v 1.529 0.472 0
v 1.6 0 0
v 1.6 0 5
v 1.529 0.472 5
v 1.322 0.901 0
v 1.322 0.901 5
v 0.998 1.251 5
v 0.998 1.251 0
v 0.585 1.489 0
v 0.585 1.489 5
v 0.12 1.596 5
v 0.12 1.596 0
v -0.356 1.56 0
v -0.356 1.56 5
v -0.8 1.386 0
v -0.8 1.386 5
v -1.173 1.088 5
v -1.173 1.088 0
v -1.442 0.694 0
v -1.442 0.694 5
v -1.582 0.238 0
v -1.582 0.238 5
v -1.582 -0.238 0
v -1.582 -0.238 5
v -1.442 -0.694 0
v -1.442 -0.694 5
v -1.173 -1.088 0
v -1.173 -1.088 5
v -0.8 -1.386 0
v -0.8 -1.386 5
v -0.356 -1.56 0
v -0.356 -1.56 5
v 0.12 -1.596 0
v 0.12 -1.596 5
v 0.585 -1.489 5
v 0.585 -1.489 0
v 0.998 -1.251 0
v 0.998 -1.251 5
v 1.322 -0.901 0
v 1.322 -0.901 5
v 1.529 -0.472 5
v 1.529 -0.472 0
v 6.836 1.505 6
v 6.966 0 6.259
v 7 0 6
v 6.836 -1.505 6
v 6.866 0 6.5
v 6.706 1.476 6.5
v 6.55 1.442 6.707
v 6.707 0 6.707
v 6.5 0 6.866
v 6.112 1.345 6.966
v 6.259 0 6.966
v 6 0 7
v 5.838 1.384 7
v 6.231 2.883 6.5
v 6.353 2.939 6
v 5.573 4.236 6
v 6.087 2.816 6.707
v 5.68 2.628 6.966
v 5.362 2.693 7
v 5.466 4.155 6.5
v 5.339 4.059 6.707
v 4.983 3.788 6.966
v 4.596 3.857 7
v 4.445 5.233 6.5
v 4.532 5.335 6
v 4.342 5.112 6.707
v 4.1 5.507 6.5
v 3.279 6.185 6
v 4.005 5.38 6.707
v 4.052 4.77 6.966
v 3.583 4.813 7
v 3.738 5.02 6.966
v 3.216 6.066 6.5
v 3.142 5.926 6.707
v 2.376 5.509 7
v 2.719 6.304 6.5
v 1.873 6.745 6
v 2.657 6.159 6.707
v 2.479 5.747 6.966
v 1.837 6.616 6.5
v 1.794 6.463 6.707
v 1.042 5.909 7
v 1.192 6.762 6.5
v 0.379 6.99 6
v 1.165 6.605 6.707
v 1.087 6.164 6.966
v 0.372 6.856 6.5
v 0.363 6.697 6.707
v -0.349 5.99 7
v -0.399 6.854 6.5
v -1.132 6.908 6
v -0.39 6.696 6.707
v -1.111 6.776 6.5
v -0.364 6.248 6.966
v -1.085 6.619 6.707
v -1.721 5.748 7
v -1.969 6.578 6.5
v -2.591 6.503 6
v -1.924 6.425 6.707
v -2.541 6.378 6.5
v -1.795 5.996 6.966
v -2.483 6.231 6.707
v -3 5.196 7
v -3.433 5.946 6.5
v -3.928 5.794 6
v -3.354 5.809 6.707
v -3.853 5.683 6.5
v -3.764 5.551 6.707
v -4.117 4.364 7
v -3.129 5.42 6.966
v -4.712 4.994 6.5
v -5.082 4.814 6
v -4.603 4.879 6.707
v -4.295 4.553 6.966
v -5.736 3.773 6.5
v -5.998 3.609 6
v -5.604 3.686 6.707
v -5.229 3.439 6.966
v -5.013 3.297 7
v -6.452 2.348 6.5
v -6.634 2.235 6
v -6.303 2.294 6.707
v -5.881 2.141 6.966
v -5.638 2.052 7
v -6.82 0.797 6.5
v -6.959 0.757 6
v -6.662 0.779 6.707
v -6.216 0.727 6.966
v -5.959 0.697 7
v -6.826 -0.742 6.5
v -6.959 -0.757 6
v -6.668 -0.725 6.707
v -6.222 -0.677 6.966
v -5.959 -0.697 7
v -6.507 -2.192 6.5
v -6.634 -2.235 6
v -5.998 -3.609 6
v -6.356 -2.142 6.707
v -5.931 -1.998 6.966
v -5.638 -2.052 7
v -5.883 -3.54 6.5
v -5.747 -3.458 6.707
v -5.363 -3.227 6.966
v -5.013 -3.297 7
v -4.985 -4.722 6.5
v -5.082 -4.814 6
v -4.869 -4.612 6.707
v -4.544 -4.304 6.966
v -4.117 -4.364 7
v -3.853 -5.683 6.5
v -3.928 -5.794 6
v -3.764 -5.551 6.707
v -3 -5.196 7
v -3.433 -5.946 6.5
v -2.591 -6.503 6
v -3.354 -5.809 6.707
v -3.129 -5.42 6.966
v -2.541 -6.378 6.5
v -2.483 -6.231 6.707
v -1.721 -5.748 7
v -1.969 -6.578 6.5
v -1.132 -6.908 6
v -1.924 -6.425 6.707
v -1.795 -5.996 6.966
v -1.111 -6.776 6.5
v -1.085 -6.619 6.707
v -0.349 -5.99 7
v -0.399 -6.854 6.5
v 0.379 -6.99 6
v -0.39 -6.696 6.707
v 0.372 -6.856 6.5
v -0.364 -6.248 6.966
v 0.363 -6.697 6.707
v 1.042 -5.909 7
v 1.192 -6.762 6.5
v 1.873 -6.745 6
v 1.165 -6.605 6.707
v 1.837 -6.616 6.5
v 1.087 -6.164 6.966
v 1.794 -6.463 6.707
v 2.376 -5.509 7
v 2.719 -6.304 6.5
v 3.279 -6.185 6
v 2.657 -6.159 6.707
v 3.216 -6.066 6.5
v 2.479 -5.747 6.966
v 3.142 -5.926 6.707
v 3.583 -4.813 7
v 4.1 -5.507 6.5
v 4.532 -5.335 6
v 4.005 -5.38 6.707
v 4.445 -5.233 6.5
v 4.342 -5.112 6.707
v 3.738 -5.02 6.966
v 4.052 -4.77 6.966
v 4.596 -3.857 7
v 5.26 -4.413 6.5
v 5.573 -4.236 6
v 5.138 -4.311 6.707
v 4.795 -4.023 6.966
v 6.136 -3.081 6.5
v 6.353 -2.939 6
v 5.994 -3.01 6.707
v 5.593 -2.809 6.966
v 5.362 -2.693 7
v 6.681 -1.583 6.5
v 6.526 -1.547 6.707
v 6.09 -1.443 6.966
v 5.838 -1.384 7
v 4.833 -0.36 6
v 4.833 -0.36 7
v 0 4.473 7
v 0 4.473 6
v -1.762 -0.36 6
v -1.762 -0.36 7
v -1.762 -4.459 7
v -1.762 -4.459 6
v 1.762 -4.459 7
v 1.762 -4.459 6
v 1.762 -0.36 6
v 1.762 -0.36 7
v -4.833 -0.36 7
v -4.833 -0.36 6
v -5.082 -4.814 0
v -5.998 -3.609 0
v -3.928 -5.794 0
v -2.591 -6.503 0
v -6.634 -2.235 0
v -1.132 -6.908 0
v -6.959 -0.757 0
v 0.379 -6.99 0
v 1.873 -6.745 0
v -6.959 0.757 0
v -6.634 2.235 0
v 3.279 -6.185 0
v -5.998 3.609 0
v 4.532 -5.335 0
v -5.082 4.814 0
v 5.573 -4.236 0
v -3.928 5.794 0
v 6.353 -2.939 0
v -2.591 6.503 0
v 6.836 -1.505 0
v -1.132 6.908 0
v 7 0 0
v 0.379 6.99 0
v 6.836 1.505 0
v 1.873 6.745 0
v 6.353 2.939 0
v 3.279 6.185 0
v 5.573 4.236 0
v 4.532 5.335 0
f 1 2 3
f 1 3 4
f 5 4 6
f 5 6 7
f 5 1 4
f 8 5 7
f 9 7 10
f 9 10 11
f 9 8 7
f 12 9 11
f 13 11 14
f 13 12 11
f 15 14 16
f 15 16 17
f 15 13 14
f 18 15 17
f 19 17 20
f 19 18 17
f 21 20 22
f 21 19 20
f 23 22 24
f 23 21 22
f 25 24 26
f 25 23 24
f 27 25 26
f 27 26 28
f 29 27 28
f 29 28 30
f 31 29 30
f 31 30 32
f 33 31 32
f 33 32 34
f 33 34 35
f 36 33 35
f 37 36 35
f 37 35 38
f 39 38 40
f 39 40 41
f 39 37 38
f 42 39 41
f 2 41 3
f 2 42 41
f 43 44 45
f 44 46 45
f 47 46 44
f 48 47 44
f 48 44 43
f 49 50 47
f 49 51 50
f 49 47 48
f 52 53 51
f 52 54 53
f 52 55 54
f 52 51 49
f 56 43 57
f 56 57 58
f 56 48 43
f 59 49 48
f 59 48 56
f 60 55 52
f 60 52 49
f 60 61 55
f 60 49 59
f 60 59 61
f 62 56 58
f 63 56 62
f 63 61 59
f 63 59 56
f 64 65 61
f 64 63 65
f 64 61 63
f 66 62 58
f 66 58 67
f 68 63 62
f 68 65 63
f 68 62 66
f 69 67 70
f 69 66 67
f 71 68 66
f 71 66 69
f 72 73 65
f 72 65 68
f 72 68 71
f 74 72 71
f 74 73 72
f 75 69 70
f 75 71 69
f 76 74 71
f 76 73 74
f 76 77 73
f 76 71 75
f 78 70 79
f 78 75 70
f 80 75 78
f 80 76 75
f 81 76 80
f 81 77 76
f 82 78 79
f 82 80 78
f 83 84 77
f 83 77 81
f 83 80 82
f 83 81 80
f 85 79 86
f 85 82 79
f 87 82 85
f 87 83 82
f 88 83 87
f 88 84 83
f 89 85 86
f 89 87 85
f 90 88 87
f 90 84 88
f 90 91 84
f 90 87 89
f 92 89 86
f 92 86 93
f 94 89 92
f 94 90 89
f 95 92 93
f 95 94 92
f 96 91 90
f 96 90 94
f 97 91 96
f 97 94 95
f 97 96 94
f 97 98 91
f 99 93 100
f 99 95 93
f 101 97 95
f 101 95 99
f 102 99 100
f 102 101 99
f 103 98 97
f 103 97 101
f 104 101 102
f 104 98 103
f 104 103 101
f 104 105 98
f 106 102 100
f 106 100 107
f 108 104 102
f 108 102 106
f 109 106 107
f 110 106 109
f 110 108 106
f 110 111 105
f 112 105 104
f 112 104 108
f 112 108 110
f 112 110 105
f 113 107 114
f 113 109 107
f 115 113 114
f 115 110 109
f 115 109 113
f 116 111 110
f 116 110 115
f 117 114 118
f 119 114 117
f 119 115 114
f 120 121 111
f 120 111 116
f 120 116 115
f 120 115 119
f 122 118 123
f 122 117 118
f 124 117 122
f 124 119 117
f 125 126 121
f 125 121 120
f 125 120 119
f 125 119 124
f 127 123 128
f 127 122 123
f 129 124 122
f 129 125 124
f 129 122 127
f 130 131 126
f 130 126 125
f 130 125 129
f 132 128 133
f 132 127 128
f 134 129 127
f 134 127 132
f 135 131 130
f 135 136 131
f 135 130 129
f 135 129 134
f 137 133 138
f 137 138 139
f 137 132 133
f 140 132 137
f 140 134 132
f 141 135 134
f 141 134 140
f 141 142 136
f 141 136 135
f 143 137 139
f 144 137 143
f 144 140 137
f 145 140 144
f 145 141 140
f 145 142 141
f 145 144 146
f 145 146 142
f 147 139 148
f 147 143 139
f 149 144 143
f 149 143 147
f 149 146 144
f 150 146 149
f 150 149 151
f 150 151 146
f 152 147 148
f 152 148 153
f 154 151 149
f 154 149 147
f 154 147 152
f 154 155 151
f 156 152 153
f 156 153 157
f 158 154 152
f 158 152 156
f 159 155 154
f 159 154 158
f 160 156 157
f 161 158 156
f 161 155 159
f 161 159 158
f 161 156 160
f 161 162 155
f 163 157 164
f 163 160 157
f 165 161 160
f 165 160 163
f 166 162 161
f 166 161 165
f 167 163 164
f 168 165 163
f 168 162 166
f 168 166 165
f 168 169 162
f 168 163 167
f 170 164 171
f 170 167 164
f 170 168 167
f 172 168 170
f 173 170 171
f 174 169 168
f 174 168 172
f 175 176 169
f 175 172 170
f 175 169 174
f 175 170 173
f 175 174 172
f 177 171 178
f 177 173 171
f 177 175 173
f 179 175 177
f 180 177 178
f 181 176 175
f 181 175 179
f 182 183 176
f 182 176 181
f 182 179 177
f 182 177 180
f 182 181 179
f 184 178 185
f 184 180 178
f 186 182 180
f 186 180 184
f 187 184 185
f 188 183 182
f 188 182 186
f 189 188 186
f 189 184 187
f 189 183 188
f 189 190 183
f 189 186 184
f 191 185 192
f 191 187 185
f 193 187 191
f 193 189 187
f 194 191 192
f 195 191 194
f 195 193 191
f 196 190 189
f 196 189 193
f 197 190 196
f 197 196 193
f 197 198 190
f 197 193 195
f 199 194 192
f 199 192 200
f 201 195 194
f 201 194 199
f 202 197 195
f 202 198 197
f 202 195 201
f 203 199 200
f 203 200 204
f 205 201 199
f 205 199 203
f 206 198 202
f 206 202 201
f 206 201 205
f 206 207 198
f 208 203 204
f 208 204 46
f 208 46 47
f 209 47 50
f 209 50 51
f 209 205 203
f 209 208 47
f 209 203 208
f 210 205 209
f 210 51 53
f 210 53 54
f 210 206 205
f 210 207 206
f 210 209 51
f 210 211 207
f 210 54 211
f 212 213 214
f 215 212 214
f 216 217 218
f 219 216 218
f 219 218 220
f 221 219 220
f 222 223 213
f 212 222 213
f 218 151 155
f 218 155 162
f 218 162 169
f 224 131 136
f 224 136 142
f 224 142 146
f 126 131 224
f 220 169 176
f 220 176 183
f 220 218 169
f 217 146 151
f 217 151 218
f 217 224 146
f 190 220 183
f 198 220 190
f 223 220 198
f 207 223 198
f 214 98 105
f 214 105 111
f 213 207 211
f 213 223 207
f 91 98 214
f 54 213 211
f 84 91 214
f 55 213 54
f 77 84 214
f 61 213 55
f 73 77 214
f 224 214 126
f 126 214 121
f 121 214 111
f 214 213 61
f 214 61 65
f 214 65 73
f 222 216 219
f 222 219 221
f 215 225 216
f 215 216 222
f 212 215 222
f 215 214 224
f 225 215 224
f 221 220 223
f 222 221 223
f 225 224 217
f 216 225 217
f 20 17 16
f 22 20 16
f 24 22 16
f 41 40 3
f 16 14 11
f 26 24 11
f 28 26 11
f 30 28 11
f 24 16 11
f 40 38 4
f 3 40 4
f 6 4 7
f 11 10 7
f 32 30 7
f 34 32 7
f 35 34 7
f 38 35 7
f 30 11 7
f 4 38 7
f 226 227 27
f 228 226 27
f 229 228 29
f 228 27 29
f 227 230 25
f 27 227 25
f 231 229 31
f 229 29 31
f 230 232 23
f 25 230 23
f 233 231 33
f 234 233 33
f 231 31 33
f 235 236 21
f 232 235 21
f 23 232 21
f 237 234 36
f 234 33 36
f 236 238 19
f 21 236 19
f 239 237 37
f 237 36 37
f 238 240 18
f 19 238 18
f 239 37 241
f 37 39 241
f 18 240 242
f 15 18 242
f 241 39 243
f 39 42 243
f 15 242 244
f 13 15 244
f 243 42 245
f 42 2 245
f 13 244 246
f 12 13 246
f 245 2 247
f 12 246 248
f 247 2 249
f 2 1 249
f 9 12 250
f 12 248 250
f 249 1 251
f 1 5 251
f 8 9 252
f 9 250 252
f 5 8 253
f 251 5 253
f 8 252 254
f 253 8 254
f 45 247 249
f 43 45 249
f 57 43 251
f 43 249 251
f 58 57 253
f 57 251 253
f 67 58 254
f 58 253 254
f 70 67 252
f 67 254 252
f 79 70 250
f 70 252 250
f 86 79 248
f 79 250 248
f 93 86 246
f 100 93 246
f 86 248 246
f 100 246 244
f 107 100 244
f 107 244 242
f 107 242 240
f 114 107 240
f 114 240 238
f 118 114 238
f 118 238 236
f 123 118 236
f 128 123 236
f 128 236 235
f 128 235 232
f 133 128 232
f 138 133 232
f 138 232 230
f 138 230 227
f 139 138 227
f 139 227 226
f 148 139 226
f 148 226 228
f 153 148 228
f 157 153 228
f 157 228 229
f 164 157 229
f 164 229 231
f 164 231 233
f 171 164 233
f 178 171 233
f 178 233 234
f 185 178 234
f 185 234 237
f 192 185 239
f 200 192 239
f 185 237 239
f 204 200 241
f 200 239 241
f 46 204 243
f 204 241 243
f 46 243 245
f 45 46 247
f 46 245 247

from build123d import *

# Parameters (mm, degrees)
SKETCH_1_R          = 7
SKETCH_1_R_2        = 1.6
EXTRUDE_1_DEPTH     = 5
SKETCH_2_R          = 7
EXTRUDE_2_DEPTH     = 2
FILLET_1_R          = 1
CUT_EXTRUDE_1_DEPTH = 1


with BuildPart() as part:
    # 草图1 → 凸台-拉伸1 (new body)
    with BuildSketch(Plane.XY):
        Circle(SKETCH_1_R)
        Circle(SKETCH_1_R_2, mode=Mode.SUBTRACT)
    extrude(amount=EXTRUDE_1_DEPTH)

    # 草图2 → 凸台-拉伸2 (add)
    with BuildSketch(Plane.XY.offset(5)):
        Circle(SKETCH_2_R)
    extrude(amount=EXTRUDE_2_DEPTH)

    # 圆角1
    fillet_1_edges = [part.edges().sort_by_distance(p)[0] for p in [
        (-7, 0, 7),
    ]]
    fillet(fillet_1_edges, radius=FILLET_1_R)

    # 草图4 → 切除-拉伸1 (cut)
    with BuildSketch(Plane.XY.offset(7)):
        Polygon((0, 4.472906985), (-4.833165044, -0.360258059), (-1.762054267, -0.360258059), (-1.762054267, -4.458639339), (1.762054267, -4.458639339), (1.762054267, -0.360258059), (4.833165044, -0.360258059), align=None)
    extrude(amount=-CUT_EXTRUDE_1_DEPTH, mode=Mode.SUBTRACT)


solid = part.part
